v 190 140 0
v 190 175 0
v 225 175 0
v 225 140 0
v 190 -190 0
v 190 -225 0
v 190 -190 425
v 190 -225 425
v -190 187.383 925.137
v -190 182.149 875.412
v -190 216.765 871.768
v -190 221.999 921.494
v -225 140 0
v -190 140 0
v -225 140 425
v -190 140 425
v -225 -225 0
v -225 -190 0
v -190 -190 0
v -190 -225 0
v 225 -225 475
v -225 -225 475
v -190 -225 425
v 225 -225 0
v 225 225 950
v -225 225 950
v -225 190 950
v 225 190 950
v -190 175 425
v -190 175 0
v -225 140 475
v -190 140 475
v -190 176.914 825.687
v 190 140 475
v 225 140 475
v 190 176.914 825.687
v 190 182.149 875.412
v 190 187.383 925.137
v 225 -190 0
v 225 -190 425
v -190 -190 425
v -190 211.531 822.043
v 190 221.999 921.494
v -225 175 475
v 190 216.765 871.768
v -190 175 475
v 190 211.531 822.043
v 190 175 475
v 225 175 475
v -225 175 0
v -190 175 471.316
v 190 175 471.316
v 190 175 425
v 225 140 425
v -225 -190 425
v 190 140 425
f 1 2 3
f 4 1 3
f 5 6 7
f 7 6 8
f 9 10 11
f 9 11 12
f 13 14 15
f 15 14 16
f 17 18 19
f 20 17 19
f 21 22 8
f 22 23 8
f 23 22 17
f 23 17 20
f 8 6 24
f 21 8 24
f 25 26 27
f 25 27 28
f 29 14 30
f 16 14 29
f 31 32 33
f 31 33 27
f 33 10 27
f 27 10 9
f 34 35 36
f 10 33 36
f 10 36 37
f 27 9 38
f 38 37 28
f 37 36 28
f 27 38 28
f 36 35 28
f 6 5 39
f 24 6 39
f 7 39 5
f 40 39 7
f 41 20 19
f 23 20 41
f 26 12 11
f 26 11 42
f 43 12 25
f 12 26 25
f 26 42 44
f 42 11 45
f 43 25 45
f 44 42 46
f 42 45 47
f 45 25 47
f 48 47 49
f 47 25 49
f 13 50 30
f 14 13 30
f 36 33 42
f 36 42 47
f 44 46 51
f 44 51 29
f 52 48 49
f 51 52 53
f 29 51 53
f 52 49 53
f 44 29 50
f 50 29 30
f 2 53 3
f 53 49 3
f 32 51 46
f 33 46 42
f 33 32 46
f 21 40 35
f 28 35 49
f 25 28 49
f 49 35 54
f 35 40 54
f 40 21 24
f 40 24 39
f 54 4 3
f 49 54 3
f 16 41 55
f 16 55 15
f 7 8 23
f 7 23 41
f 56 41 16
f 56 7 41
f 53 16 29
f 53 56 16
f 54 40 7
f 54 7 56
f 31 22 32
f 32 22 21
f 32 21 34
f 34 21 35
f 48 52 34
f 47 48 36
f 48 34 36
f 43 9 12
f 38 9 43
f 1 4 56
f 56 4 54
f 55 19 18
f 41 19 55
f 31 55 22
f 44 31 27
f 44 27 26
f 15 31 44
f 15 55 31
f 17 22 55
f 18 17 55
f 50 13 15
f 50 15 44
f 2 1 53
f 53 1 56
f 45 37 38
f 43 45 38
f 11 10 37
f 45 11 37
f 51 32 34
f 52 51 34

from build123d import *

# Parameters (mm, degrees)
F0_W     = 450
F0_H     = 450
F1_DEPTH = 950
F2_W     = 50
F2_H     = 50
F2_H_2   = 425
F2_W_2   = 330
F3_DEPTH = 450.001
F4_W     = 380
F4_H     = 425
F5_DEPTH = 450.001
F6_W     = 380
F6_H     = 50
F6_H_2   = 352.6243293636
F7_DEPTH = 134.2592361444


with BuildPart() as f1:
    # F0 (on Top) → F1 (new body)
    with BuildSketch(Plane.XY):
        Rectangle(F0_W, F0_H)
    extrude(amount=F1_DEPTH)

    # F2 (on face) → F3 (cut, through all)
    with BuildSketch(Plane.YZ.offset(225)):
        Polygon((-225, 475), (140, 475), (190, 950), (-225, 950), align=None)
        Polygon((175, 475), (225, 475), (225, 950), align=None)
        with Locations((200, 450)):
            Rectangle(F2_W, F2_H)
        with Locations((200, 212.5)):
            Rectangle(F2_W, F2_H_2)
        with Locations((-25, 212.5)):
            Rectangle(F2_W_2, F2_H_2)
    extrude(amount=-F3_DEPTH, mode=Mode.SUBTRACT)

    # F4 (on face) → F5 (cut, through all)
    with BuildSketch(Plane.XZ.offset(225)):
        with Locations((0, 212.5)):
            Rectangle(F4_W, F4_H)
    extrude(amount=-F5_DEPTH, mode=Mode.SUBTRACT)

    # F6 (on face) → F7 (cut, through all)
    with BuildSketch(Plane(origin=(0, 89.0136986301, -9.3698630137), x_dir=(1, 0, 0), z_dir=(0, -0.9945054529, 0.1046847845))):
        with Locations((0, 914.6702893338)):
            Rectangle(F6_W, F6_H)
        with Locations((0, 663.358124652)):
            Rectangle(F6_W, F6_H_2)
    extrude(amount=-F7_DEPTH, mode=Mode.SUBTRACT)


solid = f1.part
